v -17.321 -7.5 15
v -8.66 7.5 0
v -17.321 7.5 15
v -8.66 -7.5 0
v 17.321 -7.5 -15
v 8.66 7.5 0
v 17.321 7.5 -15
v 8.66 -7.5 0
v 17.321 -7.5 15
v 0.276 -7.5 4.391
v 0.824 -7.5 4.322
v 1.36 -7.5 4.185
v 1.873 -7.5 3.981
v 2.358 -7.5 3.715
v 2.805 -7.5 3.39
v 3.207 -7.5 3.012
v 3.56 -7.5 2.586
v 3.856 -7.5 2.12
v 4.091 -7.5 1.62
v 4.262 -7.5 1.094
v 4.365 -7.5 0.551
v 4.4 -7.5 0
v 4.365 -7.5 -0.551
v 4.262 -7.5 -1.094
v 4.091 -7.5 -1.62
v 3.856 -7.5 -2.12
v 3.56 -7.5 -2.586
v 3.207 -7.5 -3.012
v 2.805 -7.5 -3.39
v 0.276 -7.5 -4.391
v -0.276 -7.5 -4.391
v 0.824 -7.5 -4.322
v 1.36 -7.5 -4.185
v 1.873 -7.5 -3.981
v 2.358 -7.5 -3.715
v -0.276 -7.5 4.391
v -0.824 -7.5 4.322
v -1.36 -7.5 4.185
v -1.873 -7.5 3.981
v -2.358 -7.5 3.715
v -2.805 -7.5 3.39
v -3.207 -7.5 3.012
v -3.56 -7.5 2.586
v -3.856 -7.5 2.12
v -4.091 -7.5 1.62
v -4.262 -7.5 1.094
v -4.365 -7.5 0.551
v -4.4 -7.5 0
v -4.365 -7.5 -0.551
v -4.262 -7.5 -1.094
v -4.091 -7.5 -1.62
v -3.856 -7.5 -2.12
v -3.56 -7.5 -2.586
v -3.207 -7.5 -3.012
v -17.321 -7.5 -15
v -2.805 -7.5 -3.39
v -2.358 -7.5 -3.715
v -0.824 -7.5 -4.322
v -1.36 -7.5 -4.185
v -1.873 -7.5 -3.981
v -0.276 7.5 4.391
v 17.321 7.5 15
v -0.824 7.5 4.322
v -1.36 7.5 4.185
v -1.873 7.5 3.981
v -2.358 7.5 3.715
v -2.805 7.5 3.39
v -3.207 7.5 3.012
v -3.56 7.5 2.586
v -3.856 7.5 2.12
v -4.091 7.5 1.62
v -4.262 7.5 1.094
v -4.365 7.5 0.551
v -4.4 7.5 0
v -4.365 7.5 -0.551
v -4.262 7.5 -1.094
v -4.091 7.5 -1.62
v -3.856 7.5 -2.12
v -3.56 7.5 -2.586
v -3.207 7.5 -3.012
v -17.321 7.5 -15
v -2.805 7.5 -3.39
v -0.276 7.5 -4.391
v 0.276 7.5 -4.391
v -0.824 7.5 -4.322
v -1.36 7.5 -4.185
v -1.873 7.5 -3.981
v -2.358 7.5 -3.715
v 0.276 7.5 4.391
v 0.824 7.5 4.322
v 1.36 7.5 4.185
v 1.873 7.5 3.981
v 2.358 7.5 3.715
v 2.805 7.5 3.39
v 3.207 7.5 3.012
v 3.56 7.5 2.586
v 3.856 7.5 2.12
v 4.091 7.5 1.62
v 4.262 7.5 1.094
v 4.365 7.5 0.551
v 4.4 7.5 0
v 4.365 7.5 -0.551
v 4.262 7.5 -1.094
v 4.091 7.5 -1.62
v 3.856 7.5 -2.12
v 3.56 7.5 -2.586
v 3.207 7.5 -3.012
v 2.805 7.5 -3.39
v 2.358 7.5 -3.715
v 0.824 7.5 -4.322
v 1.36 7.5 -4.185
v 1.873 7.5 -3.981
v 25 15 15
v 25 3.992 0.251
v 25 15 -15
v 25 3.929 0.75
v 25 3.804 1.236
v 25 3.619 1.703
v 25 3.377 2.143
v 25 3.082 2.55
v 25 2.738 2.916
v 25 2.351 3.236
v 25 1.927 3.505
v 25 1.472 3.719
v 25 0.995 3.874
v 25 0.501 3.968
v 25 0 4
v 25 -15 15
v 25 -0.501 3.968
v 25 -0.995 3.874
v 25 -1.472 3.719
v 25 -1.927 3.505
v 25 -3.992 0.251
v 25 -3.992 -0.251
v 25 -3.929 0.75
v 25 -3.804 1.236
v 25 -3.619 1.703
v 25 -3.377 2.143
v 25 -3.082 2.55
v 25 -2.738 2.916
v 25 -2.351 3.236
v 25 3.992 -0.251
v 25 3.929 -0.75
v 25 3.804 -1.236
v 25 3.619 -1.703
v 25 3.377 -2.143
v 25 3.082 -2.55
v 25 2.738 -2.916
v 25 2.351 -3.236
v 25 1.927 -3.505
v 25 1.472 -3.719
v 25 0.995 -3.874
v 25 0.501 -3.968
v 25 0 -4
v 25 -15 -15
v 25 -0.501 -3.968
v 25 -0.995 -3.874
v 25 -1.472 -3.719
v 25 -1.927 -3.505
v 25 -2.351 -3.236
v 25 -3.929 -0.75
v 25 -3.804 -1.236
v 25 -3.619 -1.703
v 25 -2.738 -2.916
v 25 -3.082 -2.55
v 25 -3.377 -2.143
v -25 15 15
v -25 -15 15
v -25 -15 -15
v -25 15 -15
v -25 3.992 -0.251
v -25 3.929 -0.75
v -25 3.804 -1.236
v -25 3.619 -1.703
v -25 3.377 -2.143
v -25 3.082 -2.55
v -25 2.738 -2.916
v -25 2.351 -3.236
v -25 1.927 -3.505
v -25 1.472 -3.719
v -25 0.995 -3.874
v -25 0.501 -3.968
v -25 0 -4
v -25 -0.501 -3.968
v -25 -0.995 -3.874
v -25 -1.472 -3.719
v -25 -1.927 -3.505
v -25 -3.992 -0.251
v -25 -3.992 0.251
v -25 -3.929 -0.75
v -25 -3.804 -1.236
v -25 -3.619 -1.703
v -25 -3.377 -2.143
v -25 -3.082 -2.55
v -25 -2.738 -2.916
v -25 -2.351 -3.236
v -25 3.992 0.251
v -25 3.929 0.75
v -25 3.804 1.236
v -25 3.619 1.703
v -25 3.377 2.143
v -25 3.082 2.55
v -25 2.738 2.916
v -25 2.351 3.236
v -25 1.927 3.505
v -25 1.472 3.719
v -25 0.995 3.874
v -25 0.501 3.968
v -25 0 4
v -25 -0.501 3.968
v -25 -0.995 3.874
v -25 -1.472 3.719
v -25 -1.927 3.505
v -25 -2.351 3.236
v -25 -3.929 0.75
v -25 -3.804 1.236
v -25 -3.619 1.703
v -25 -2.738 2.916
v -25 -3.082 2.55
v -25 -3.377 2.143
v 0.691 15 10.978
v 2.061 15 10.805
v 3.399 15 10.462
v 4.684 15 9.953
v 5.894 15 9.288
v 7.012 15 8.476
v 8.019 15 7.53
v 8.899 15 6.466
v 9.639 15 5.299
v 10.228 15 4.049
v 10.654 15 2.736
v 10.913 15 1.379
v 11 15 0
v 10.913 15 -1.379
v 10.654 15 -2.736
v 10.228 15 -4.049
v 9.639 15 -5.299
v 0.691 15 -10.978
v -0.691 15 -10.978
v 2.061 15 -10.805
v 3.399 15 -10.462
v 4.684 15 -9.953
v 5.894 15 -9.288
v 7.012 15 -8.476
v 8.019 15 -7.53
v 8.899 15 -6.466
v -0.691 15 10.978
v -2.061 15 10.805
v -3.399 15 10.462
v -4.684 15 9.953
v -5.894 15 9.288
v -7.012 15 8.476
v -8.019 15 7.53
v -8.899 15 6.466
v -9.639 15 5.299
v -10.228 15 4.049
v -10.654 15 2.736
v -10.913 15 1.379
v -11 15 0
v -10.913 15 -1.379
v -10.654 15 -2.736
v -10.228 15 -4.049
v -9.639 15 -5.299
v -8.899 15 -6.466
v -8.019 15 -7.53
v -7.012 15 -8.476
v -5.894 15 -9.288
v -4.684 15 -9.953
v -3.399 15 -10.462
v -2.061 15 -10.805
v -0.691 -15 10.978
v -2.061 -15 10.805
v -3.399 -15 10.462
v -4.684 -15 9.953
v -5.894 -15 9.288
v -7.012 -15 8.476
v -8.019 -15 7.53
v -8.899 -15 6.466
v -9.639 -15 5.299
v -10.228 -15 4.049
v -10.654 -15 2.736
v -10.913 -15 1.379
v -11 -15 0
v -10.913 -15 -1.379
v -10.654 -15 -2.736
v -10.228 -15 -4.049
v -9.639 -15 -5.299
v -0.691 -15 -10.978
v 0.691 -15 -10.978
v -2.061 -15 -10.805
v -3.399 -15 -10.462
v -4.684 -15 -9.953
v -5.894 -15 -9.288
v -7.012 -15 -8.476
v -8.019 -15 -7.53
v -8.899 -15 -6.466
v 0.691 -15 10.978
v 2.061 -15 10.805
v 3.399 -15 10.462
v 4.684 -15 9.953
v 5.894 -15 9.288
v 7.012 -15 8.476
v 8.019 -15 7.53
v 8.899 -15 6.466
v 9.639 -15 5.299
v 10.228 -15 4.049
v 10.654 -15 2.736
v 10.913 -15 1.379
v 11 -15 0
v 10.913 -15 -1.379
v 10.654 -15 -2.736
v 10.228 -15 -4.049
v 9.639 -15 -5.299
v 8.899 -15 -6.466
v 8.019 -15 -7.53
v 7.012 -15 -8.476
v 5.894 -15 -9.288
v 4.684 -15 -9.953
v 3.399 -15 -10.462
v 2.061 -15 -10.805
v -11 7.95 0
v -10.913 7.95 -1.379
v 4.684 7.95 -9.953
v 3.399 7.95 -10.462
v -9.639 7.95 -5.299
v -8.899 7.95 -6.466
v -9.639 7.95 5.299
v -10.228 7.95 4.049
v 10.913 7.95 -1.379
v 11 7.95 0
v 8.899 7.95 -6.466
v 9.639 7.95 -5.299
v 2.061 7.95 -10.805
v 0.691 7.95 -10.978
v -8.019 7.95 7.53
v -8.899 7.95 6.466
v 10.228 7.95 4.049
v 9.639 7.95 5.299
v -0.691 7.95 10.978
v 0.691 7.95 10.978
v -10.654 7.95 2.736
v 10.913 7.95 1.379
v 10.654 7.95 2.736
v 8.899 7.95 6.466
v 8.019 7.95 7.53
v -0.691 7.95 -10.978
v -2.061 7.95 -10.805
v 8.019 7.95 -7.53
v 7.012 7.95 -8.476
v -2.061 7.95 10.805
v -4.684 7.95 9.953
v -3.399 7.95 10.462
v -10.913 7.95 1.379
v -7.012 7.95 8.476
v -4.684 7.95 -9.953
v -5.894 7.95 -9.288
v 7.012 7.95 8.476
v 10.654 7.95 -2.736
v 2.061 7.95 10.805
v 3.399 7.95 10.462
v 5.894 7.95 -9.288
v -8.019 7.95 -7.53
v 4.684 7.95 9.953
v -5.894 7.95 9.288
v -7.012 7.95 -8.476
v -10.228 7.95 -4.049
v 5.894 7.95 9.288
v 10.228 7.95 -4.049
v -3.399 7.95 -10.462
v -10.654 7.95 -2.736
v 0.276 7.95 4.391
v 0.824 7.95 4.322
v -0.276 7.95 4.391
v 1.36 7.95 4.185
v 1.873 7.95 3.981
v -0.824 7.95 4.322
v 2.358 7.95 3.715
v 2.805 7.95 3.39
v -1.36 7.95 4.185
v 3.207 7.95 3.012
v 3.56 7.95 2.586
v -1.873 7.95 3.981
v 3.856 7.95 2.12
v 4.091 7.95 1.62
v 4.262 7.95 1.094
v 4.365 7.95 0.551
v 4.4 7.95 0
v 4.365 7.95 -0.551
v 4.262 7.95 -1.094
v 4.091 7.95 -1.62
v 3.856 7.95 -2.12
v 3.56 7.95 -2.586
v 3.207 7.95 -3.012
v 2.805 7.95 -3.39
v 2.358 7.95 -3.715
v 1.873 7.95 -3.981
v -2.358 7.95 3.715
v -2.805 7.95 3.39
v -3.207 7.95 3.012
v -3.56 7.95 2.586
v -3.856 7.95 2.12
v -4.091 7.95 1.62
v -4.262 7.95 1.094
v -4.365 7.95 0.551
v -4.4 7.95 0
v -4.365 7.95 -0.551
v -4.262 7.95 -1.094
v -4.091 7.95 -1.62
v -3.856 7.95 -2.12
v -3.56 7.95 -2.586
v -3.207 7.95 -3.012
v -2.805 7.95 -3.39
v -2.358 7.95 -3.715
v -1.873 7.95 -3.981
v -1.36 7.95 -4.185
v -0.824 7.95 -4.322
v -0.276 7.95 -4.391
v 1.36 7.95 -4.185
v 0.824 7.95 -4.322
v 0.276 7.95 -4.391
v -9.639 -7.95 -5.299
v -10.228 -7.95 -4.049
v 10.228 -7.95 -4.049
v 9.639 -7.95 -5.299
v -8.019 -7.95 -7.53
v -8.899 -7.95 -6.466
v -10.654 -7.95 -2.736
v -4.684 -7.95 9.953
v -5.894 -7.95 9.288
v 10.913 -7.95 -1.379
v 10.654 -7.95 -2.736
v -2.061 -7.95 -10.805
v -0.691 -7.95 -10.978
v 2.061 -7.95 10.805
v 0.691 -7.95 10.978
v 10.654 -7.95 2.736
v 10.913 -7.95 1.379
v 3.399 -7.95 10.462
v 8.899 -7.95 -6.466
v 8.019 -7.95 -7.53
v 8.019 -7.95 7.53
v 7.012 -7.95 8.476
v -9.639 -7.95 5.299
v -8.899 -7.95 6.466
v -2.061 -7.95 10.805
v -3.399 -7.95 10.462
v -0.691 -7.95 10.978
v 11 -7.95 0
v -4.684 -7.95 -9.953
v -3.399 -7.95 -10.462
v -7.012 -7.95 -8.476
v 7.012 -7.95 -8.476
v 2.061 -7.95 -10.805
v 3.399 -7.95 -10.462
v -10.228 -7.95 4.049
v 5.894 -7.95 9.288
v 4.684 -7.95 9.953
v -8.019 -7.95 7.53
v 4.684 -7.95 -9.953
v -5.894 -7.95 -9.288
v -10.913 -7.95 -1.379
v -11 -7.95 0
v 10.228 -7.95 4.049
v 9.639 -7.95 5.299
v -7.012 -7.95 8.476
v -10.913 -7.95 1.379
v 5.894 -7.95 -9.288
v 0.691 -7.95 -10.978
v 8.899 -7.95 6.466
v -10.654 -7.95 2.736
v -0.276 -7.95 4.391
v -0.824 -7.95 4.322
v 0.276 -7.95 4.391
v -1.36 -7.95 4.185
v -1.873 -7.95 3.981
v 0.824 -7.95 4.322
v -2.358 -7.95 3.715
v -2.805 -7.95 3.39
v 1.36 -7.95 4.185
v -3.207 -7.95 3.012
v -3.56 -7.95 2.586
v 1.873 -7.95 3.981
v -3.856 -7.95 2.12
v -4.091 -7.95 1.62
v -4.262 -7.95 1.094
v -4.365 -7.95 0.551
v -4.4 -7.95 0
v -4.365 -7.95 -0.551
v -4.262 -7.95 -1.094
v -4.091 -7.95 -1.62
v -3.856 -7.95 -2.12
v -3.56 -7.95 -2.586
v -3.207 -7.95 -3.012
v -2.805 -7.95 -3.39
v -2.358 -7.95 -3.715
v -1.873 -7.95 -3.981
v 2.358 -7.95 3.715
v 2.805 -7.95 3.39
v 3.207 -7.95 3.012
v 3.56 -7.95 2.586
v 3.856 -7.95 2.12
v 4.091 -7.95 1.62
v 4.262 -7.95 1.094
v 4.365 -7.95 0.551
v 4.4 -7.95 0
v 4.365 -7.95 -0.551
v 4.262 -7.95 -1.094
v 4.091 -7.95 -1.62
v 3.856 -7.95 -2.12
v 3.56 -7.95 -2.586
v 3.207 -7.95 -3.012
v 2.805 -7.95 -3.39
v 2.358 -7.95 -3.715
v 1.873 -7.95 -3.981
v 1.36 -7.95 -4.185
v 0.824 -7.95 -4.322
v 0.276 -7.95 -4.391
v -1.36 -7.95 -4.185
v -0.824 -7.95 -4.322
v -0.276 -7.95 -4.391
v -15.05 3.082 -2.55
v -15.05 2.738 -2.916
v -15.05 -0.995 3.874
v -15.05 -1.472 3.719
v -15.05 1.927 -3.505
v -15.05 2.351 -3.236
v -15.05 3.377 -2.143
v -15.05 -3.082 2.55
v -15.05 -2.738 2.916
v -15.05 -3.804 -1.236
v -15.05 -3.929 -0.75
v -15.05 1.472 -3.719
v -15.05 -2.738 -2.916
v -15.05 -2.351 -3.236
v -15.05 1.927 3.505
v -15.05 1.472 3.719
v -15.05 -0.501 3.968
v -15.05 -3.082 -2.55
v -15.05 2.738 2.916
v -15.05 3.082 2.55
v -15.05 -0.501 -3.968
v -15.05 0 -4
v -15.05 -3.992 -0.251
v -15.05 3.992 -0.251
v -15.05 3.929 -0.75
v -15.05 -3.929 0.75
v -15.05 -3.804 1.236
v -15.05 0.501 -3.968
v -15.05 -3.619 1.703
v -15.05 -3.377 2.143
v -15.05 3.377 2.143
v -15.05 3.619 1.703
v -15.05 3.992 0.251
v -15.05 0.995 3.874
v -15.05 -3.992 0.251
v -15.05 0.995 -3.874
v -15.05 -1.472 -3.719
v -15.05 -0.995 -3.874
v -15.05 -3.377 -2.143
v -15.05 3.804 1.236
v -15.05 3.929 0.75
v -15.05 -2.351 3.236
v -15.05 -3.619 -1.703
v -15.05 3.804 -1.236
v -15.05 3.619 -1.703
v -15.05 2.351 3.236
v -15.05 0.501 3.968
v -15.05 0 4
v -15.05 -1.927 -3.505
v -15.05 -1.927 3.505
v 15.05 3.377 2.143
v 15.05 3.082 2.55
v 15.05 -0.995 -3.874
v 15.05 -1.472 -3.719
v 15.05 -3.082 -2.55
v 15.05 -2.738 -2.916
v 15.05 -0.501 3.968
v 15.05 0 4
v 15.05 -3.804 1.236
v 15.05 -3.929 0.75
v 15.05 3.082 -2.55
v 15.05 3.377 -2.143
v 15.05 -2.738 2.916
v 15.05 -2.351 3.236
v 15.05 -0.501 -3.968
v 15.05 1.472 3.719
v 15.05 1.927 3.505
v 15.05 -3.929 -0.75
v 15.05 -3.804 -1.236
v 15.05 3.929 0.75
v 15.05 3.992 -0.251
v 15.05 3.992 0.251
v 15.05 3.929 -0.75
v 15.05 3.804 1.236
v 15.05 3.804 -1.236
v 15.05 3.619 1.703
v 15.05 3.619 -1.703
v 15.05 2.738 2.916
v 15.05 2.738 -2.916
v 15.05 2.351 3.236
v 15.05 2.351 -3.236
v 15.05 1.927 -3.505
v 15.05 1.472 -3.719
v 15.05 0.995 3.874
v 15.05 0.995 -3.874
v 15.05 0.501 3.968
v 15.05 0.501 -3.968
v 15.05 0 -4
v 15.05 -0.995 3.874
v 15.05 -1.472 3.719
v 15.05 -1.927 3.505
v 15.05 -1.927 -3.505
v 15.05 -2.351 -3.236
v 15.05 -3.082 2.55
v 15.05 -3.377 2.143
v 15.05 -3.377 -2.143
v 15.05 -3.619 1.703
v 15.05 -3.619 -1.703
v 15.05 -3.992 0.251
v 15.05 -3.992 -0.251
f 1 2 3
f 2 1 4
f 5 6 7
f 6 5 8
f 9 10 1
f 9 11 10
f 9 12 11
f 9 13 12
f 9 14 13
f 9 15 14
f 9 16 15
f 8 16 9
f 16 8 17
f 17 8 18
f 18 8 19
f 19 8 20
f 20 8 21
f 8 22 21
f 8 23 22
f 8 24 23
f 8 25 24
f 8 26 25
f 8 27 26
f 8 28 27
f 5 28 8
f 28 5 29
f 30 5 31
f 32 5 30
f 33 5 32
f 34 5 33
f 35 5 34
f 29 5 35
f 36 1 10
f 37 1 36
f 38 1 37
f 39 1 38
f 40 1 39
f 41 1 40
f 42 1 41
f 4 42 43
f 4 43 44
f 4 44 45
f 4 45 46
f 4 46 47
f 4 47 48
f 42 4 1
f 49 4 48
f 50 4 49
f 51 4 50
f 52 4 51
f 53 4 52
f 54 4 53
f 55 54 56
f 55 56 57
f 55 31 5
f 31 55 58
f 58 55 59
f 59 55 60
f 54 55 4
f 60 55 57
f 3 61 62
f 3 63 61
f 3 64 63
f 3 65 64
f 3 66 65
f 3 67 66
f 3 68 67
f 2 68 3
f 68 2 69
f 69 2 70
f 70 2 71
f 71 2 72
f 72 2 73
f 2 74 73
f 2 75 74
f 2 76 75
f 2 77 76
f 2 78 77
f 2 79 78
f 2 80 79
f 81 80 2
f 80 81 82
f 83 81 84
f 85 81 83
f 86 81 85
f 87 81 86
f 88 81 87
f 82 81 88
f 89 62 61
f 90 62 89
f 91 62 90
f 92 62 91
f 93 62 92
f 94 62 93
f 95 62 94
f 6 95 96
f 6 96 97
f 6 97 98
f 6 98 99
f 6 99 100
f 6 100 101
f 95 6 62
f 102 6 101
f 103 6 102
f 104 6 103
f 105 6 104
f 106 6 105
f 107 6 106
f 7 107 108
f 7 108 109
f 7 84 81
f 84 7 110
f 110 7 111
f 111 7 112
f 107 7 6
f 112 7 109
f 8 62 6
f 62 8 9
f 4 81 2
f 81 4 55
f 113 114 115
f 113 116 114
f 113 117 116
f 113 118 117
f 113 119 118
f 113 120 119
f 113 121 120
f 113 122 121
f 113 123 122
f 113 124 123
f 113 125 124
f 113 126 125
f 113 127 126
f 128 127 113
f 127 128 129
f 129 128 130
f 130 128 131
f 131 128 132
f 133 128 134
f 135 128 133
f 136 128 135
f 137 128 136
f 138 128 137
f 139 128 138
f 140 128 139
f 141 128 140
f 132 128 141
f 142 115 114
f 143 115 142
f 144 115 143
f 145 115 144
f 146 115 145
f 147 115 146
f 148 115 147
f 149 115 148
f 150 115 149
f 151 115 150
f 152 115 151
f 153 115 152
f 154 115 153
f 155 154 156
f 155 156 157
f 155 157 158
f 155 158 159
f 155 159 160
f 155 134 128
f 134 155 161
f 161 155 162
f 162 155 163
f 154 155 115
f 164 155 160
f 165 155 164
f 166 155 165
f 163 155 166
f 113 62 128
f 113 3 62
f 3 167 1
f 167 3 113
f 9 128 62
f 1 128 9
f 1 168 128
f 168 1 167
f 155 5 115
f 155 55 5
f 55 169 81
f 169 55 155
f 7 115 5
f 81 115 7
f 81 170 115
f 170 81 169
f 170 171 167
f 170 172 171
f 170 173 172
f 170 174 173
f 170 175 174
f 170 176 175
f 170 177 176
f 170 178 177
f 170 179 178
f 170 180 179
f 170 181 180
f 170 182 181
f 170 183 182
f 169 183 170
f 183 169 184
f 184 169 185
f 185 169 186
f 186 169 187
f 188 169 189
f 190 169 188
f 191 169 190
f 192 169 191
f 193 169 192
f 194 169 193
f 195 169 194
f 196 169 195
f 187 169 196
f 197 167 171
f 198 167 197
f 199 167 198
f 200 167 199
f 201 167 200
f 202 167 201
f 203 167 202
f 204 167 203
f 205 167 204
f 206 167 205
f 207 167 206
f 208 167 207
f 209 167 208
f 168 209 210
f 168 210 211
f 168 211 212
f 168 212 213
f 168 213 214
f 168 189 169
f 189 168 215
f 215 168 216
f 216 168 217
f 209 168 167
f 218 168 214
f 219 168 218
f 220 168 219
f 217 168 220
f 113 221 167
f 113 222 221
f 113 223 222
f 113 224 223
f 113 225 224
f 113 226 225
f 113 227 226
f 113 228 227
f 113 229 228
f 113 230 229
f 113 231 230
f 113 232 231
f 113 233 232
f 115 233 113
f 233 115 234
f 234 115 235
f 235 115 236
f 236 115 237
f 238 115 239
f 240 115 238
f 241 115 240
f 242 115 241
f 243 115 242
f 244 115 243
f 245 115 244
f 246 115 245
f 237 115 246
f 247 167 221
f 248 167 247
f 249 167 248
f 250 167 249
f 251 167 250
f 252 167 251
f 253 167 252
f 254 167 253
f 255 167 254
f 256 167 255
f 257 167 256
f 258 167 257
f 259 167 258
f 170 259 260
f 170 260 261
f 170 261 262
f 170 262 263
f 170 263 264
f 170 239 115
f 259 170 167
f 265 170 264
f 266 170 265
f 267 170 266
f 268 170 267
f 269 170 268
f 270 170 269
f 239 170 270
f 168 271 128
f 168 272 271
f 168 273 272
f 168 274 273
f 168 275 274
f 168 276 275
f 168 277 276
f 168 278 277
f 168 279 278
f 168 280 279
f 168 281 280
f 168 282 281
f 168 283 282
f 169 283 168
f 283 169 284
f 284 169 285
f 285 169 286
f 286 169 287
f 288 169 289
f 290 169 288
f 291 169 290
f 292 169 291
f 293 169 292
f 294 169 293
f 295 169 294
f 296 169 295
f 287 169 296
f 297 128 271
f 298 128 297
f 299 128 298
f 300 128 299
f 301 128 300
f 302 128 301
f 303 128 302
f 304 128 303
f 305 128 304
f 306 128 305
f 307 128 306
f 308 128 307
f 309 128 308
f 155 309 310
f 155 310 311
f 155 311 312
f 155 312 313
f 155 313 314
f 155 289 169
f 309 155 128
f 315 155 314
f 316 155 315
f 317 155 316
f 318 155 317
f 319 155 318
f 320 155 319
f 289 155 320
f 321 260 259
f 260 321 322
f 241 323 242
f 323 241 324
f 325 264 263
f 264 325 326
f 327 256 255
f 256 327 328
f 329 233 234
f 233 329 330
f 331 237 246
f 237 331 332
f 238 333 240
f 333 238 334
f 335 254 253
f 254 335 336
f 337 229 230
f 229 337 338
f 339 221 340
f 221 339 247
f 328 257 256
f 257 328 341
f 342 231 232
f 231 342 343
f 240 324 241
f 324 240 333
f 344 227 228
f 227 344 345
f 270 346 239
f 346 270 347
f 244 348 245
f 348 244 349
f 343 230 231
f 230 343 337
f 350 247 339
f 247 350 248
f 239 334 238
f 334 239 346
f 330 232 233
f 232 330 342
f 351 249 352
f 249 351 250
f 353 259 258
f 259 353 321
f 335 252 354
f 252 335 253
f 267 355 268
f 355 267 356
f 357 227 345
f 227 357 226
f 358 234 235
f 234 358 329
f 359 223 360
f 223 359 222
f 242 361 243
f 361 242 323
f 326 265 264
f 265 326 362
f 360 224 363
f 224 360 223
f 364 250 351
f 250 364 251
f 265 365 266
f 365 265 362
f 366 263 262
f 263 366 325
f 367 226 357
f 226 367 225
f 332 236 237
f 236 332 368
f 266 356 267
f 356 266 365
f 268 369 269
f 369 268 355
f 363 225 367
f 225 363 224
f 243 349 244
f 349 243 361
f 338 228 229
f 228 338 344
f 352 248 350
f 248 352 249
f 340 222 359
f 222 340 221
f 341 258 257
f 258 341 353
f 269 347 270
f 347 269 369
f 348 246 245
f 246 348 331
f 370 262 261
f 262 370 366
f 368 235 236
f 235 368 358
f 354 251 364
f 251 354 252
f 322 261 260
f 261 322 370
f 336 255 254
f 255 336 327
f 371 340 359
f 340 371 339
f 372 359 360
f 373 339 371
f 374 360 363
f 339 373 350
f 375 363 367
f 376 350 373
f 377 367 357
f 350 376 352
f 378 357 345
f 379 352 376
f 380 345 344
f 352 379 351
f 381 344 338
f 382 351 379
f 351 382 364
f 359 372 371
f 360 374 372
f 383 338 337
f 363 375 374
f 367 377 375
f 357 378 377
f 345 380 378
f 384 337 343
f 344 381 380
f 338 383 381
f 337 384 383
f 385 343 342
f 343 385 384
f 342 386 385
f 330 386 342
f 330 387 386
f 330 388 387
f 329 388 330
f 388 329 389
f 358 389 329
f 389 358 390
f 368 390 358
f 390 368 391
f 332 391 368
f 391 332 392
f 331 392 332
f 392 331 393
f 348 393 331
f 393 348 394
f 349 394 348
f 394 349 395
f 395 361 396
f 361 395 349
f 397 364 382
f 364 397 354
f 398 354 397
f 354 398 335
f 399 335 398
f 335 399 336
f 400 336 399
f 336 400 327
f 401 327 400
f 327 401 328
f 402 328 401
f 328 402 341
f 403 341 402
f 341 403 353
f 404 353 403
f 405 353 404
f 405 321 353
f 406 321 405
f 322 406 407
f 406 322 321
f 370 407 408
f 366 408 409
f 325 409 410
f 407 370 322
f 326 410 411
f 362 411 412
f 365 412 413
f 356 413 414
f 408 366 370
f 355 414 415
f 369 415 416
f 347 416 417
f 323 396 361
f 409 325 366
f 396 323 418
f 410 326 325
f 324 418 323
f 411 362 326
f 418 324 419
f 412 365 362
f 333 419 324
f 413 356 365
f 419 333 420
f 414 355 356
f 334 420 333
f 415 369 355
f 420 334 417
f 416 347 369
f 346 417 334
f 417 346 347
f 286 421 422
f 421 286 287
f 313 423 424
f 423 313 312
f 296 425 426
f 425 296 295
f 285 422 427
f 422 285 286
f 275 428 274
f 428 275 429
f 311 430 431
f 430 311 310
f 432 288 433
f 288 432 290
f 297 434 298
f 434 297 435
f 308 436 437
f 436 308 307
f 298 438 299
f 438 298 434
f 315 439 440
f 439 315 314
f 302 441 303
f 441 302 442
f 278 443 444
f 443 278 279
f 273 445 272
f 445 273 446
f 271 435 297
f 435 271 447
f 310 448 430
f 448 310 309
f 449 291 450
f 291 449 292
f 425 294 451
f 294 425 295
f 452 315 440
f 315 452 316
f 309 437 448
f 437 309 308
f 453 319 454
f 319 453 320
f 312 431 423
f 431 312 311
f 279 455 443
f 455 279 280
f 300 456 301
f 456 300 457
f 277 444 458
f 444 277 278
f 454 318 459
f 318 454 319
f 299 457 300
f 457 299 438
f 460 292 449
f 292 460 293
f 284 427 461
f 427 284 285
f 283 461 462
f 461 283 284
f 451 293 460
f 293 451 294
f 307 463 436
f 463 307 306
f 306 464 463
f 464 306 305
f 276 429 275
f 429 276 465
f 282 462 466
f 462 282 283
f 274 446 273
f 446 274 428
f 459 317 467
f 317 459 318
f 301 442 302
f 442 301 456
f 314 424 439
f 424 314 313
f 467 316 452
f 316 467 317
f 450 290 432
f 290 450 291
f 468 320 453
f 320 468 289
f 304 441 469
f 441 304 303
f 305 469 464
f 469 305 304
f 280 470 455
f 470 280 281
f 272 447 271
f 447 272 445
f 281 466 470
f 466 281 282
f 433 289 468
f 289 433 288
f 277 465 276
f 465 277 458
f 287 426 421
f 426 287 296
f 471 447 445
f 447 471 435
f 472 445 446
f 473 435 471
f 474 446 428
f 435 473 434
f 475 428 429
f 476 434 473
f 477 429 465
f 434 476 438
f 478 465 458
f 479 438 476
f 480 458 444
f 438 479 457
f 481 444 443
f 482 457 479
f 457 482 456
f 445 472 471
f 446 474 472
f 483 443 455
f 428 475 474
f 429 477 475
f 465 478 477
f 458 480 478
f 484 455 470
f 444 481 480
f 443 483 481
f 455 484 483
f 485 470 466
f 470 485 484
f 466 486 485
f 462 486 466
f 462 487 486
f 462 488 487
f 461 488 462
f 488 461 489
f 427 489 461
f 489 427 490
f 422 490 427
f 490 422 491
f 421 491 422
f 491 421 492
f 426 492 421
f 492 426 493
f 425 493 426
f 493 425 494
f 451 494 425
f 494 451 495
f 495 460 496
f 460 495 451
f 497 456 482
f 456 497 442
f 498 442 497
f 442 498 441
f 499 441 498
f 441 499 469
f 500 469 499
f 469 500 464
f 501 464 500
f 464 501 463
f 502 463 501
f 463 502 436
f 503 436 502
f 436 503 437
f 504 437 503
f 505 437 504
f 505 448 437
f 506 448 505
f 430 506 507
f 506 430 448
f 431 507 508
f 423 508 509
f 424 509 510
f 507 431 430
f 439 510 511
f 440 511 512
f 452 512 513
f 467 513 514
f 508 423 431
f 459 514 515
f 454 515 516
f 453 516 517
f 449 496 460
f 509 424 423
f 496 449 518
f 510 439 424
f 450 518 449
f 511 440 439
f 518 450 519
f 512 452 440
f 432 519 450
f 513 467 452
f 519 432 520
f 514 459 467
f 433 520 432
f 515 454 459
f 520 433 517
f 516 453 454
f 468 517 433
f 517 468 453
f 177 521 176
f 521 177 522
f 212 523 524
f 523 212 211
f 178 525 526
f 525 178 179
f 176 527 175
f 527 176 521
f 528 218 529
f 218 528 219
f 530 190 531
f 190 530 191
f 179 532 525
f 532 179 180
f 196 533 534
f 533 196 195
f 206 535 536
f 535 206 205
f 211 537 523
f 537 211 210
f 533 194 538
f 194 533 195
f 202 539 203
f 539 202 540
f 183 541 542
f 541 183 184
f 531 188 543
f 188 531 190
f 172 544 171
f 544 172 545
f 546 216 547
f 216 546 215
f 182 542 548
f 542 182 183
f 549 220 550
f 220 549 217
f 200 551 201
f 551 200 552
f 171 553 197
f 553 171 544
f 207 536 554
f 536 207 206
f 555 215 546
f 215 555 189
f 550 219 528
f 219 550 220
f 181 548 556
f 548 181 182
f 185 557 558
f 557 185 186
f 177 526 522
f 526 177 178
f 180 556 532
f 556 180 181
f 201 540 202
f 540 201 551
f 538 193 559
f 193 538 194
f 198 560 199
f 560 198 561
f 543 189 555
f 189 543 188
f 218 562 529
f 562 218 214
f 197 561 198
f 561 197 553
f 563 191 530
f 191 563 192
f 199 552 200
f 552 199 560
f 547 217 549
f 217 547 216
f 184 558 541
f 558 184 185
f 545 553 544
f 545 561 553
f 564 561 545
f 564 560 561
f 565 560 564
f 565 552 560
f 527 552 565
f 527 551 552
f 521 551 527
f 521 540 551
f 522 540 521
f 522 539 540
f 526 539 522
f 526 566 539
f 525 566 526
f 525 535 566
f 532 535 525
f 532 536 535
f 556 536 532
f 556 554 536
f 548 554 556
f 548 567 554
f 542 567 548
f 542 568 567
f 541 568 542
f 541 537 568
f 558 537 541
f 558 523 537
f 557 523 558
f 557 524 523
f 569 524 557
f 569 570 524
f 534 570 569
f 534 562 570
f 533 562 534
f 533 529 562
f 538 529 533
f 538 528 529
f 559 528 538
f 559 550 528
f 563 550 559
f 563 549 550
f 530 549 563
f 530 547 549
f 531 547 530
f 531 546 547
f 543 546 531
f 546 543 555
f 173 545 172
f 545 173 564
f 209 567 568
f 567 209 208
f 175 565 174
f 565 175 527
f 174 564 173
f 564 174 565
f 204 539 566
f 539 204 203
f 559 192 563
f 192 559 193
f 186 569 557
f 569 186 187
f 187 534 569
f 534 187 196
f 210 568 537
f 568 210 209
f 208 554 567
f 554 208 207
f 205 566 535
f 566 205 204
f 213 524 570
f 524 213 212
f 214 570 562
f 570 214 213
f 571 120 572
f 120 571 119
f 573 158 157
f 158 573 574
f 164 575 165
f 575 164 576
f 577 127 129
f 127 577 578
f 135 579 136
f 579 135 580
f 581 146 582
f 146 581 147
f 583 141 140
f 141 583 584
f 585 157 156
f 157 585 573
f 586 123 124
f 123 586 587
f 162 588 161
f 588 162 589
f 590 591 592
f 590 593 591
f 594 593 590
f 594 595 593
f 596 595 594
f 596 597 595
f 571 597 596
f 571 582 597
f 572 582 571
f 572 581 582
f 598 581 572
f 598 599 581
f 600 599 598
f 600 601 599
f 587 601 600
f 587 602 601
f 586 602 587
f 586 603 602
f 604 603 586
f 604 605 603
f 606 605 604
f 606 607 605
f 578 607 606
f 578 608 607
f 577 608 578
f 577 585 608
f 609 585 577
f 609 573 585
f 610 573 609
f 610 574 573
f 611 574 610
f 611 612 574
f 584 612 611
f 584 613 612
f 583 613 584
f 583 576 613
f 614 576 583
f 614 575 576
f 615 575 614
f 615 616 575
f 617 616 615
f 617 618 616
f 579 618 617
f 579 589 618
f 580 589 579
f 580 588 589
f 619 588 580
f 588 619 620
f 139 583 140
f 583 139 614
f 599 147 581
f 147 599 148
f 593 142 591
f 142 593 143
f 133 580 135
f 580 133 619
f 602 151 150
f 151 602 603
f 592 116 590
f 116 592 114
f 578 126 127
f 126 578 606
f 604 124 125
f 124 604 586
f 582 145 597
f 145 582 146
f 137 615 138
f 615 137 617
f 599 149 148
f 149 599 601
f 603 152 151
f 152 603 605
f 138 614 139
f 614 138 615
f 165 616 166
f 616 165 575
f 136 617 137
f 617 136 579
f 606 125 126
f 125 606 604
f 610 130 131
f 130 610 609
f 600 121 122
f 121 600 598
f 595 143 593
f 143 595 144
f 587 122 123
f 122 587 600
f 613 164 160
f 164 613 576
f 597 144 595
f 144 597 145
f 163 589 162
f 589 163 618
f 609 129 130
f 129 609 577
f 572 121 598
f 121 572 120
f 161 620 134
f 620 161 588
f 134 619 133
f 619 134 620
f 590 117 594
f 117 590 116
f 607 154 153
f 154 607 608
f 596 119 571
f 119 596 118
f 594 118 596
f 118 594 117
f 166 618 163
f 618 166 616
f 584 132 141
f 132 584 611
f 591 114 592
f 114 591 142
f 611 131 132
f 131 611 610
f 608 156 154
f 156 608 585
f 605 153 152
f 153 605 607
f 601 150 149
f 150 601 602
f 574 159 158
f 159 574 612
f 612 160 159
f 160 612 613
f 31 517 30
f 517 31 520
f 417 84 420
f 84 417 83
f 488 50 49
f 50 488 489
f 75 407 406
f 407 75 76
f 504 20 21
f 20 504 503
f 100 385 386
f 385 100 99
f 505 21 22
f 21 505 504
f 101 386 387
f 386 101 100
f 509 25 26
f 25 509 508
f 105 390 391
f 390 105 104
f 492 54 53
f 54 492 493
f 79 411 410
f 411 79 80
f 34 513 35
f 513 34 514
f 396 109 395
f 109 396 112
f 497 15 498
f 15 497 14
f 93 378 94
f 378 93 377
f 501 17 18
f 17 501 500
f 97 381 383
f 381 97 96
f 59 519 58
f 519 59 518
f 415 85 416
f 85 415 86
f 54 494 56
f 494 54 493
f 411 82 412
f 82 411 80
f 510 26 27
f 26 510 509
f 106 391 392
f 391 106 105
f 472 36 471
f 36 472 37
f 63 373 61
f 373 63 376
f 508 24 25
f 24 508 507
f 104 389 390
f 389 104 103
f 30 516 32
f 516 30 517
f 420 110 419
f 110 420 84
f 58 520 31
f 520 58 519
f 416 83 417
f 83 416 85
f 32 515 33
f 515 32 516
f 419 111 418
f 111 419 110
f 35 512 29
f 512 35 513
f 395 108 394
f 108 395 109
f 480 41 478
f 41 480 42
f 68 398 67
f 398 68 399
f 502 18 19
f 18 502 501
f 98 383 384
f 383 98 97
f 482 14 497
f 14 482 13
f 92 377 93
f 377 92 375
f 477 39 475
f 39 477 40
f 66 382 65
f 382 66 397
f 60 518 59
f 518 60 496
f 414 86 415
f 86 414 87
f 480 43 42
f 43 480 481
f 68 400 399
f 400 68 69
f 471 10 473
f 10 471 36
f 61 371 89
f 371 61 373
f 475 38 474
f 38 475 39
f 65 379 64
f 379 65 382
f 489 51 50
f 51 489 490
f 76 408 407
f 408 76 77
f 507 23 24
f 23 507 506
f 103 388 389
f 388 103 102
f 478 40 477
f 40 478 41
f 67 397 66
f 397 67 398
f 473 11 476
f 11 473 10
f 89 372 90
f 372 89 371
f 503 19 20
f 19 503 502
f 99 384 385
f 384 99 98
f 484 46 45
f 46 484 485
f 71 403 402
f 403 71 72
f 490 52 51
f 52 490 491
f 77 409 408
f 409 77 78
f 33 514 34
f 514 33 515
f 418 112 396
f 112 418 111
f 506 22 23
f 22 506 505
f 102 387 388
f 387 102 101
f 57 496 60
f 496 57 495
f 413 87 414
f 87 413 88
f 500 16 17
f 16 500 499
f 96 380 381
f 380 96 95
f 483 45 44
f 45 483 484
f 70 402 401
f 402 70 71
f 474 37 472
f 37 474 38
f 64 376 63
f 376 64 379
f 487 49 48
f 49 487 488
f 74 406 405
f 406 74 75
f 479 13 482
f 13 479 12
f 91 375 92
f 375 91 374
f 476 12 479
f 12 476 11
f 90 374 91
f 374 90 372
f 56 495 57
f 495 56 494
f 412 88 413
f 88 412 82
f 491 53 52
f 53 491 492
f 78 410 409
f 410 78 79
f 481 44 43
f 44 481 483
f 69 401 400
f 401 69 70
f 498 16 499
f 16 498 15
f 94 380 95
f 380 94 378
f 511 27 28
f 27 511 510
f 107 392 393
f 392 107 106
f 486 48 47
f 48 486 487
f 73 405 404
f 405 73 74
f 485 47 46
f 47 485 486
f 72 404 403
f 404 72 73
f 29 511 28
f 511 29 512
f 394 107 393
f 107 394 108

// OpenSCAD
// file: joystick_defines.scad
// Standard skate bearing
bearing_inside_dia = 8;
bearing_outside_dia = 22;
bearing_thickness = 7;

// Arbitrary value
shaft_dia = 15;

z_fight_fudge = 0.05;
//z_fight_fudge = 0;

// Set this to 1 to translate everything to printable mode
printable_mode = 0;

// Gimba corel block sizes 
gimbal_core_x = 50;
gimbal_core_y = 30;
gimbal_core_z = gimbal_core_y;

// Gimbal frame sizes 

gimbal_frame_thickness = 10; 

// The 1.8 is 2sin(45)ish, the maximum y on the xy plane the core can occupy
gimbal_frame_x = gimbal_core_x+2*gimbal_frame_thickness+2; 
gimbal_frame_y = (gimbal_core_y * 1.8)+gimbal_frame_thickness;
gimbal_frame_z = gimbal_core_z;

circle_faces = 50;

module bearing()
{
	difference()
	{
		cylinder(h=7+2*z_fight_fudge, r = (bearing_outside_dia/2), $fn=circle_faces);

		/*translate([0,0,-z_fight_fudge])
			%cylinder(h=9, r = (bearing_inside_dia/2), $fn=circle_faces);*/
	}
}
		
// main file
include <joystick_defines.scad>

x_rot_pin_depth = 10;

gimbal_core();

module gimbal_core()
{
	translate([0,0,(gimbal_core_z/2) * printable_mode])
	difference()
	{
		cube([gimbal_core_x, gimbal_core_y, gimbal_core_z], center=true);
		// Y rot bearings
		translate([0,gimbal_core_y/2+z_fight_fudge,0])
			rotate([90,0,0])
				bearing();
		translate([0,-gimbal_core_y/2-z_fight_fudge,0])
			rotate([-90,0,0])
				bearing();
		// X rot pin holes
		translate([-(gimbal_core_x/2)-z_fight_fudge,0,0])
			rotate([0,90,0])
				cylinder(h=x_rot_pin_depth, r = (bearing_inside_dia/2), $fn=circle_faces);
		translate([(gimbal_core_x/2)+z_fight_fudge,0,0])
			rotate([0,-90,0])
				cylinder(h=x_rot_pin_depth, r = (bearing_inside_dia/2), $fn=circle_faces);
		// Shaft slot
		for (n = [-9:9])
		{
			rotate([0,(n/3)*10,0])
					cube([shaft_dia, shaft_dia,100],center=true);
					//cylinder(h=100, r = (shaft_dia/2),  $fn=circle_faces);
					
		}
		// Shaft pin
		translate([0,gimbal_core_y/2+z_fight_fudge,0])
			rotate([90,0,0])
				cylinder(h=(gimbal_core_y+2*z_fight_fudge), r= (bearing_inside_dia/2)*1.1, $fn = circle_faces);

		// Chamfers
		//translate([-(gimbal_core_x/2),-(gimbal_core_y/2),-(gimbal_core_z/2)])
			//chamfer_block();
		
	}
}
